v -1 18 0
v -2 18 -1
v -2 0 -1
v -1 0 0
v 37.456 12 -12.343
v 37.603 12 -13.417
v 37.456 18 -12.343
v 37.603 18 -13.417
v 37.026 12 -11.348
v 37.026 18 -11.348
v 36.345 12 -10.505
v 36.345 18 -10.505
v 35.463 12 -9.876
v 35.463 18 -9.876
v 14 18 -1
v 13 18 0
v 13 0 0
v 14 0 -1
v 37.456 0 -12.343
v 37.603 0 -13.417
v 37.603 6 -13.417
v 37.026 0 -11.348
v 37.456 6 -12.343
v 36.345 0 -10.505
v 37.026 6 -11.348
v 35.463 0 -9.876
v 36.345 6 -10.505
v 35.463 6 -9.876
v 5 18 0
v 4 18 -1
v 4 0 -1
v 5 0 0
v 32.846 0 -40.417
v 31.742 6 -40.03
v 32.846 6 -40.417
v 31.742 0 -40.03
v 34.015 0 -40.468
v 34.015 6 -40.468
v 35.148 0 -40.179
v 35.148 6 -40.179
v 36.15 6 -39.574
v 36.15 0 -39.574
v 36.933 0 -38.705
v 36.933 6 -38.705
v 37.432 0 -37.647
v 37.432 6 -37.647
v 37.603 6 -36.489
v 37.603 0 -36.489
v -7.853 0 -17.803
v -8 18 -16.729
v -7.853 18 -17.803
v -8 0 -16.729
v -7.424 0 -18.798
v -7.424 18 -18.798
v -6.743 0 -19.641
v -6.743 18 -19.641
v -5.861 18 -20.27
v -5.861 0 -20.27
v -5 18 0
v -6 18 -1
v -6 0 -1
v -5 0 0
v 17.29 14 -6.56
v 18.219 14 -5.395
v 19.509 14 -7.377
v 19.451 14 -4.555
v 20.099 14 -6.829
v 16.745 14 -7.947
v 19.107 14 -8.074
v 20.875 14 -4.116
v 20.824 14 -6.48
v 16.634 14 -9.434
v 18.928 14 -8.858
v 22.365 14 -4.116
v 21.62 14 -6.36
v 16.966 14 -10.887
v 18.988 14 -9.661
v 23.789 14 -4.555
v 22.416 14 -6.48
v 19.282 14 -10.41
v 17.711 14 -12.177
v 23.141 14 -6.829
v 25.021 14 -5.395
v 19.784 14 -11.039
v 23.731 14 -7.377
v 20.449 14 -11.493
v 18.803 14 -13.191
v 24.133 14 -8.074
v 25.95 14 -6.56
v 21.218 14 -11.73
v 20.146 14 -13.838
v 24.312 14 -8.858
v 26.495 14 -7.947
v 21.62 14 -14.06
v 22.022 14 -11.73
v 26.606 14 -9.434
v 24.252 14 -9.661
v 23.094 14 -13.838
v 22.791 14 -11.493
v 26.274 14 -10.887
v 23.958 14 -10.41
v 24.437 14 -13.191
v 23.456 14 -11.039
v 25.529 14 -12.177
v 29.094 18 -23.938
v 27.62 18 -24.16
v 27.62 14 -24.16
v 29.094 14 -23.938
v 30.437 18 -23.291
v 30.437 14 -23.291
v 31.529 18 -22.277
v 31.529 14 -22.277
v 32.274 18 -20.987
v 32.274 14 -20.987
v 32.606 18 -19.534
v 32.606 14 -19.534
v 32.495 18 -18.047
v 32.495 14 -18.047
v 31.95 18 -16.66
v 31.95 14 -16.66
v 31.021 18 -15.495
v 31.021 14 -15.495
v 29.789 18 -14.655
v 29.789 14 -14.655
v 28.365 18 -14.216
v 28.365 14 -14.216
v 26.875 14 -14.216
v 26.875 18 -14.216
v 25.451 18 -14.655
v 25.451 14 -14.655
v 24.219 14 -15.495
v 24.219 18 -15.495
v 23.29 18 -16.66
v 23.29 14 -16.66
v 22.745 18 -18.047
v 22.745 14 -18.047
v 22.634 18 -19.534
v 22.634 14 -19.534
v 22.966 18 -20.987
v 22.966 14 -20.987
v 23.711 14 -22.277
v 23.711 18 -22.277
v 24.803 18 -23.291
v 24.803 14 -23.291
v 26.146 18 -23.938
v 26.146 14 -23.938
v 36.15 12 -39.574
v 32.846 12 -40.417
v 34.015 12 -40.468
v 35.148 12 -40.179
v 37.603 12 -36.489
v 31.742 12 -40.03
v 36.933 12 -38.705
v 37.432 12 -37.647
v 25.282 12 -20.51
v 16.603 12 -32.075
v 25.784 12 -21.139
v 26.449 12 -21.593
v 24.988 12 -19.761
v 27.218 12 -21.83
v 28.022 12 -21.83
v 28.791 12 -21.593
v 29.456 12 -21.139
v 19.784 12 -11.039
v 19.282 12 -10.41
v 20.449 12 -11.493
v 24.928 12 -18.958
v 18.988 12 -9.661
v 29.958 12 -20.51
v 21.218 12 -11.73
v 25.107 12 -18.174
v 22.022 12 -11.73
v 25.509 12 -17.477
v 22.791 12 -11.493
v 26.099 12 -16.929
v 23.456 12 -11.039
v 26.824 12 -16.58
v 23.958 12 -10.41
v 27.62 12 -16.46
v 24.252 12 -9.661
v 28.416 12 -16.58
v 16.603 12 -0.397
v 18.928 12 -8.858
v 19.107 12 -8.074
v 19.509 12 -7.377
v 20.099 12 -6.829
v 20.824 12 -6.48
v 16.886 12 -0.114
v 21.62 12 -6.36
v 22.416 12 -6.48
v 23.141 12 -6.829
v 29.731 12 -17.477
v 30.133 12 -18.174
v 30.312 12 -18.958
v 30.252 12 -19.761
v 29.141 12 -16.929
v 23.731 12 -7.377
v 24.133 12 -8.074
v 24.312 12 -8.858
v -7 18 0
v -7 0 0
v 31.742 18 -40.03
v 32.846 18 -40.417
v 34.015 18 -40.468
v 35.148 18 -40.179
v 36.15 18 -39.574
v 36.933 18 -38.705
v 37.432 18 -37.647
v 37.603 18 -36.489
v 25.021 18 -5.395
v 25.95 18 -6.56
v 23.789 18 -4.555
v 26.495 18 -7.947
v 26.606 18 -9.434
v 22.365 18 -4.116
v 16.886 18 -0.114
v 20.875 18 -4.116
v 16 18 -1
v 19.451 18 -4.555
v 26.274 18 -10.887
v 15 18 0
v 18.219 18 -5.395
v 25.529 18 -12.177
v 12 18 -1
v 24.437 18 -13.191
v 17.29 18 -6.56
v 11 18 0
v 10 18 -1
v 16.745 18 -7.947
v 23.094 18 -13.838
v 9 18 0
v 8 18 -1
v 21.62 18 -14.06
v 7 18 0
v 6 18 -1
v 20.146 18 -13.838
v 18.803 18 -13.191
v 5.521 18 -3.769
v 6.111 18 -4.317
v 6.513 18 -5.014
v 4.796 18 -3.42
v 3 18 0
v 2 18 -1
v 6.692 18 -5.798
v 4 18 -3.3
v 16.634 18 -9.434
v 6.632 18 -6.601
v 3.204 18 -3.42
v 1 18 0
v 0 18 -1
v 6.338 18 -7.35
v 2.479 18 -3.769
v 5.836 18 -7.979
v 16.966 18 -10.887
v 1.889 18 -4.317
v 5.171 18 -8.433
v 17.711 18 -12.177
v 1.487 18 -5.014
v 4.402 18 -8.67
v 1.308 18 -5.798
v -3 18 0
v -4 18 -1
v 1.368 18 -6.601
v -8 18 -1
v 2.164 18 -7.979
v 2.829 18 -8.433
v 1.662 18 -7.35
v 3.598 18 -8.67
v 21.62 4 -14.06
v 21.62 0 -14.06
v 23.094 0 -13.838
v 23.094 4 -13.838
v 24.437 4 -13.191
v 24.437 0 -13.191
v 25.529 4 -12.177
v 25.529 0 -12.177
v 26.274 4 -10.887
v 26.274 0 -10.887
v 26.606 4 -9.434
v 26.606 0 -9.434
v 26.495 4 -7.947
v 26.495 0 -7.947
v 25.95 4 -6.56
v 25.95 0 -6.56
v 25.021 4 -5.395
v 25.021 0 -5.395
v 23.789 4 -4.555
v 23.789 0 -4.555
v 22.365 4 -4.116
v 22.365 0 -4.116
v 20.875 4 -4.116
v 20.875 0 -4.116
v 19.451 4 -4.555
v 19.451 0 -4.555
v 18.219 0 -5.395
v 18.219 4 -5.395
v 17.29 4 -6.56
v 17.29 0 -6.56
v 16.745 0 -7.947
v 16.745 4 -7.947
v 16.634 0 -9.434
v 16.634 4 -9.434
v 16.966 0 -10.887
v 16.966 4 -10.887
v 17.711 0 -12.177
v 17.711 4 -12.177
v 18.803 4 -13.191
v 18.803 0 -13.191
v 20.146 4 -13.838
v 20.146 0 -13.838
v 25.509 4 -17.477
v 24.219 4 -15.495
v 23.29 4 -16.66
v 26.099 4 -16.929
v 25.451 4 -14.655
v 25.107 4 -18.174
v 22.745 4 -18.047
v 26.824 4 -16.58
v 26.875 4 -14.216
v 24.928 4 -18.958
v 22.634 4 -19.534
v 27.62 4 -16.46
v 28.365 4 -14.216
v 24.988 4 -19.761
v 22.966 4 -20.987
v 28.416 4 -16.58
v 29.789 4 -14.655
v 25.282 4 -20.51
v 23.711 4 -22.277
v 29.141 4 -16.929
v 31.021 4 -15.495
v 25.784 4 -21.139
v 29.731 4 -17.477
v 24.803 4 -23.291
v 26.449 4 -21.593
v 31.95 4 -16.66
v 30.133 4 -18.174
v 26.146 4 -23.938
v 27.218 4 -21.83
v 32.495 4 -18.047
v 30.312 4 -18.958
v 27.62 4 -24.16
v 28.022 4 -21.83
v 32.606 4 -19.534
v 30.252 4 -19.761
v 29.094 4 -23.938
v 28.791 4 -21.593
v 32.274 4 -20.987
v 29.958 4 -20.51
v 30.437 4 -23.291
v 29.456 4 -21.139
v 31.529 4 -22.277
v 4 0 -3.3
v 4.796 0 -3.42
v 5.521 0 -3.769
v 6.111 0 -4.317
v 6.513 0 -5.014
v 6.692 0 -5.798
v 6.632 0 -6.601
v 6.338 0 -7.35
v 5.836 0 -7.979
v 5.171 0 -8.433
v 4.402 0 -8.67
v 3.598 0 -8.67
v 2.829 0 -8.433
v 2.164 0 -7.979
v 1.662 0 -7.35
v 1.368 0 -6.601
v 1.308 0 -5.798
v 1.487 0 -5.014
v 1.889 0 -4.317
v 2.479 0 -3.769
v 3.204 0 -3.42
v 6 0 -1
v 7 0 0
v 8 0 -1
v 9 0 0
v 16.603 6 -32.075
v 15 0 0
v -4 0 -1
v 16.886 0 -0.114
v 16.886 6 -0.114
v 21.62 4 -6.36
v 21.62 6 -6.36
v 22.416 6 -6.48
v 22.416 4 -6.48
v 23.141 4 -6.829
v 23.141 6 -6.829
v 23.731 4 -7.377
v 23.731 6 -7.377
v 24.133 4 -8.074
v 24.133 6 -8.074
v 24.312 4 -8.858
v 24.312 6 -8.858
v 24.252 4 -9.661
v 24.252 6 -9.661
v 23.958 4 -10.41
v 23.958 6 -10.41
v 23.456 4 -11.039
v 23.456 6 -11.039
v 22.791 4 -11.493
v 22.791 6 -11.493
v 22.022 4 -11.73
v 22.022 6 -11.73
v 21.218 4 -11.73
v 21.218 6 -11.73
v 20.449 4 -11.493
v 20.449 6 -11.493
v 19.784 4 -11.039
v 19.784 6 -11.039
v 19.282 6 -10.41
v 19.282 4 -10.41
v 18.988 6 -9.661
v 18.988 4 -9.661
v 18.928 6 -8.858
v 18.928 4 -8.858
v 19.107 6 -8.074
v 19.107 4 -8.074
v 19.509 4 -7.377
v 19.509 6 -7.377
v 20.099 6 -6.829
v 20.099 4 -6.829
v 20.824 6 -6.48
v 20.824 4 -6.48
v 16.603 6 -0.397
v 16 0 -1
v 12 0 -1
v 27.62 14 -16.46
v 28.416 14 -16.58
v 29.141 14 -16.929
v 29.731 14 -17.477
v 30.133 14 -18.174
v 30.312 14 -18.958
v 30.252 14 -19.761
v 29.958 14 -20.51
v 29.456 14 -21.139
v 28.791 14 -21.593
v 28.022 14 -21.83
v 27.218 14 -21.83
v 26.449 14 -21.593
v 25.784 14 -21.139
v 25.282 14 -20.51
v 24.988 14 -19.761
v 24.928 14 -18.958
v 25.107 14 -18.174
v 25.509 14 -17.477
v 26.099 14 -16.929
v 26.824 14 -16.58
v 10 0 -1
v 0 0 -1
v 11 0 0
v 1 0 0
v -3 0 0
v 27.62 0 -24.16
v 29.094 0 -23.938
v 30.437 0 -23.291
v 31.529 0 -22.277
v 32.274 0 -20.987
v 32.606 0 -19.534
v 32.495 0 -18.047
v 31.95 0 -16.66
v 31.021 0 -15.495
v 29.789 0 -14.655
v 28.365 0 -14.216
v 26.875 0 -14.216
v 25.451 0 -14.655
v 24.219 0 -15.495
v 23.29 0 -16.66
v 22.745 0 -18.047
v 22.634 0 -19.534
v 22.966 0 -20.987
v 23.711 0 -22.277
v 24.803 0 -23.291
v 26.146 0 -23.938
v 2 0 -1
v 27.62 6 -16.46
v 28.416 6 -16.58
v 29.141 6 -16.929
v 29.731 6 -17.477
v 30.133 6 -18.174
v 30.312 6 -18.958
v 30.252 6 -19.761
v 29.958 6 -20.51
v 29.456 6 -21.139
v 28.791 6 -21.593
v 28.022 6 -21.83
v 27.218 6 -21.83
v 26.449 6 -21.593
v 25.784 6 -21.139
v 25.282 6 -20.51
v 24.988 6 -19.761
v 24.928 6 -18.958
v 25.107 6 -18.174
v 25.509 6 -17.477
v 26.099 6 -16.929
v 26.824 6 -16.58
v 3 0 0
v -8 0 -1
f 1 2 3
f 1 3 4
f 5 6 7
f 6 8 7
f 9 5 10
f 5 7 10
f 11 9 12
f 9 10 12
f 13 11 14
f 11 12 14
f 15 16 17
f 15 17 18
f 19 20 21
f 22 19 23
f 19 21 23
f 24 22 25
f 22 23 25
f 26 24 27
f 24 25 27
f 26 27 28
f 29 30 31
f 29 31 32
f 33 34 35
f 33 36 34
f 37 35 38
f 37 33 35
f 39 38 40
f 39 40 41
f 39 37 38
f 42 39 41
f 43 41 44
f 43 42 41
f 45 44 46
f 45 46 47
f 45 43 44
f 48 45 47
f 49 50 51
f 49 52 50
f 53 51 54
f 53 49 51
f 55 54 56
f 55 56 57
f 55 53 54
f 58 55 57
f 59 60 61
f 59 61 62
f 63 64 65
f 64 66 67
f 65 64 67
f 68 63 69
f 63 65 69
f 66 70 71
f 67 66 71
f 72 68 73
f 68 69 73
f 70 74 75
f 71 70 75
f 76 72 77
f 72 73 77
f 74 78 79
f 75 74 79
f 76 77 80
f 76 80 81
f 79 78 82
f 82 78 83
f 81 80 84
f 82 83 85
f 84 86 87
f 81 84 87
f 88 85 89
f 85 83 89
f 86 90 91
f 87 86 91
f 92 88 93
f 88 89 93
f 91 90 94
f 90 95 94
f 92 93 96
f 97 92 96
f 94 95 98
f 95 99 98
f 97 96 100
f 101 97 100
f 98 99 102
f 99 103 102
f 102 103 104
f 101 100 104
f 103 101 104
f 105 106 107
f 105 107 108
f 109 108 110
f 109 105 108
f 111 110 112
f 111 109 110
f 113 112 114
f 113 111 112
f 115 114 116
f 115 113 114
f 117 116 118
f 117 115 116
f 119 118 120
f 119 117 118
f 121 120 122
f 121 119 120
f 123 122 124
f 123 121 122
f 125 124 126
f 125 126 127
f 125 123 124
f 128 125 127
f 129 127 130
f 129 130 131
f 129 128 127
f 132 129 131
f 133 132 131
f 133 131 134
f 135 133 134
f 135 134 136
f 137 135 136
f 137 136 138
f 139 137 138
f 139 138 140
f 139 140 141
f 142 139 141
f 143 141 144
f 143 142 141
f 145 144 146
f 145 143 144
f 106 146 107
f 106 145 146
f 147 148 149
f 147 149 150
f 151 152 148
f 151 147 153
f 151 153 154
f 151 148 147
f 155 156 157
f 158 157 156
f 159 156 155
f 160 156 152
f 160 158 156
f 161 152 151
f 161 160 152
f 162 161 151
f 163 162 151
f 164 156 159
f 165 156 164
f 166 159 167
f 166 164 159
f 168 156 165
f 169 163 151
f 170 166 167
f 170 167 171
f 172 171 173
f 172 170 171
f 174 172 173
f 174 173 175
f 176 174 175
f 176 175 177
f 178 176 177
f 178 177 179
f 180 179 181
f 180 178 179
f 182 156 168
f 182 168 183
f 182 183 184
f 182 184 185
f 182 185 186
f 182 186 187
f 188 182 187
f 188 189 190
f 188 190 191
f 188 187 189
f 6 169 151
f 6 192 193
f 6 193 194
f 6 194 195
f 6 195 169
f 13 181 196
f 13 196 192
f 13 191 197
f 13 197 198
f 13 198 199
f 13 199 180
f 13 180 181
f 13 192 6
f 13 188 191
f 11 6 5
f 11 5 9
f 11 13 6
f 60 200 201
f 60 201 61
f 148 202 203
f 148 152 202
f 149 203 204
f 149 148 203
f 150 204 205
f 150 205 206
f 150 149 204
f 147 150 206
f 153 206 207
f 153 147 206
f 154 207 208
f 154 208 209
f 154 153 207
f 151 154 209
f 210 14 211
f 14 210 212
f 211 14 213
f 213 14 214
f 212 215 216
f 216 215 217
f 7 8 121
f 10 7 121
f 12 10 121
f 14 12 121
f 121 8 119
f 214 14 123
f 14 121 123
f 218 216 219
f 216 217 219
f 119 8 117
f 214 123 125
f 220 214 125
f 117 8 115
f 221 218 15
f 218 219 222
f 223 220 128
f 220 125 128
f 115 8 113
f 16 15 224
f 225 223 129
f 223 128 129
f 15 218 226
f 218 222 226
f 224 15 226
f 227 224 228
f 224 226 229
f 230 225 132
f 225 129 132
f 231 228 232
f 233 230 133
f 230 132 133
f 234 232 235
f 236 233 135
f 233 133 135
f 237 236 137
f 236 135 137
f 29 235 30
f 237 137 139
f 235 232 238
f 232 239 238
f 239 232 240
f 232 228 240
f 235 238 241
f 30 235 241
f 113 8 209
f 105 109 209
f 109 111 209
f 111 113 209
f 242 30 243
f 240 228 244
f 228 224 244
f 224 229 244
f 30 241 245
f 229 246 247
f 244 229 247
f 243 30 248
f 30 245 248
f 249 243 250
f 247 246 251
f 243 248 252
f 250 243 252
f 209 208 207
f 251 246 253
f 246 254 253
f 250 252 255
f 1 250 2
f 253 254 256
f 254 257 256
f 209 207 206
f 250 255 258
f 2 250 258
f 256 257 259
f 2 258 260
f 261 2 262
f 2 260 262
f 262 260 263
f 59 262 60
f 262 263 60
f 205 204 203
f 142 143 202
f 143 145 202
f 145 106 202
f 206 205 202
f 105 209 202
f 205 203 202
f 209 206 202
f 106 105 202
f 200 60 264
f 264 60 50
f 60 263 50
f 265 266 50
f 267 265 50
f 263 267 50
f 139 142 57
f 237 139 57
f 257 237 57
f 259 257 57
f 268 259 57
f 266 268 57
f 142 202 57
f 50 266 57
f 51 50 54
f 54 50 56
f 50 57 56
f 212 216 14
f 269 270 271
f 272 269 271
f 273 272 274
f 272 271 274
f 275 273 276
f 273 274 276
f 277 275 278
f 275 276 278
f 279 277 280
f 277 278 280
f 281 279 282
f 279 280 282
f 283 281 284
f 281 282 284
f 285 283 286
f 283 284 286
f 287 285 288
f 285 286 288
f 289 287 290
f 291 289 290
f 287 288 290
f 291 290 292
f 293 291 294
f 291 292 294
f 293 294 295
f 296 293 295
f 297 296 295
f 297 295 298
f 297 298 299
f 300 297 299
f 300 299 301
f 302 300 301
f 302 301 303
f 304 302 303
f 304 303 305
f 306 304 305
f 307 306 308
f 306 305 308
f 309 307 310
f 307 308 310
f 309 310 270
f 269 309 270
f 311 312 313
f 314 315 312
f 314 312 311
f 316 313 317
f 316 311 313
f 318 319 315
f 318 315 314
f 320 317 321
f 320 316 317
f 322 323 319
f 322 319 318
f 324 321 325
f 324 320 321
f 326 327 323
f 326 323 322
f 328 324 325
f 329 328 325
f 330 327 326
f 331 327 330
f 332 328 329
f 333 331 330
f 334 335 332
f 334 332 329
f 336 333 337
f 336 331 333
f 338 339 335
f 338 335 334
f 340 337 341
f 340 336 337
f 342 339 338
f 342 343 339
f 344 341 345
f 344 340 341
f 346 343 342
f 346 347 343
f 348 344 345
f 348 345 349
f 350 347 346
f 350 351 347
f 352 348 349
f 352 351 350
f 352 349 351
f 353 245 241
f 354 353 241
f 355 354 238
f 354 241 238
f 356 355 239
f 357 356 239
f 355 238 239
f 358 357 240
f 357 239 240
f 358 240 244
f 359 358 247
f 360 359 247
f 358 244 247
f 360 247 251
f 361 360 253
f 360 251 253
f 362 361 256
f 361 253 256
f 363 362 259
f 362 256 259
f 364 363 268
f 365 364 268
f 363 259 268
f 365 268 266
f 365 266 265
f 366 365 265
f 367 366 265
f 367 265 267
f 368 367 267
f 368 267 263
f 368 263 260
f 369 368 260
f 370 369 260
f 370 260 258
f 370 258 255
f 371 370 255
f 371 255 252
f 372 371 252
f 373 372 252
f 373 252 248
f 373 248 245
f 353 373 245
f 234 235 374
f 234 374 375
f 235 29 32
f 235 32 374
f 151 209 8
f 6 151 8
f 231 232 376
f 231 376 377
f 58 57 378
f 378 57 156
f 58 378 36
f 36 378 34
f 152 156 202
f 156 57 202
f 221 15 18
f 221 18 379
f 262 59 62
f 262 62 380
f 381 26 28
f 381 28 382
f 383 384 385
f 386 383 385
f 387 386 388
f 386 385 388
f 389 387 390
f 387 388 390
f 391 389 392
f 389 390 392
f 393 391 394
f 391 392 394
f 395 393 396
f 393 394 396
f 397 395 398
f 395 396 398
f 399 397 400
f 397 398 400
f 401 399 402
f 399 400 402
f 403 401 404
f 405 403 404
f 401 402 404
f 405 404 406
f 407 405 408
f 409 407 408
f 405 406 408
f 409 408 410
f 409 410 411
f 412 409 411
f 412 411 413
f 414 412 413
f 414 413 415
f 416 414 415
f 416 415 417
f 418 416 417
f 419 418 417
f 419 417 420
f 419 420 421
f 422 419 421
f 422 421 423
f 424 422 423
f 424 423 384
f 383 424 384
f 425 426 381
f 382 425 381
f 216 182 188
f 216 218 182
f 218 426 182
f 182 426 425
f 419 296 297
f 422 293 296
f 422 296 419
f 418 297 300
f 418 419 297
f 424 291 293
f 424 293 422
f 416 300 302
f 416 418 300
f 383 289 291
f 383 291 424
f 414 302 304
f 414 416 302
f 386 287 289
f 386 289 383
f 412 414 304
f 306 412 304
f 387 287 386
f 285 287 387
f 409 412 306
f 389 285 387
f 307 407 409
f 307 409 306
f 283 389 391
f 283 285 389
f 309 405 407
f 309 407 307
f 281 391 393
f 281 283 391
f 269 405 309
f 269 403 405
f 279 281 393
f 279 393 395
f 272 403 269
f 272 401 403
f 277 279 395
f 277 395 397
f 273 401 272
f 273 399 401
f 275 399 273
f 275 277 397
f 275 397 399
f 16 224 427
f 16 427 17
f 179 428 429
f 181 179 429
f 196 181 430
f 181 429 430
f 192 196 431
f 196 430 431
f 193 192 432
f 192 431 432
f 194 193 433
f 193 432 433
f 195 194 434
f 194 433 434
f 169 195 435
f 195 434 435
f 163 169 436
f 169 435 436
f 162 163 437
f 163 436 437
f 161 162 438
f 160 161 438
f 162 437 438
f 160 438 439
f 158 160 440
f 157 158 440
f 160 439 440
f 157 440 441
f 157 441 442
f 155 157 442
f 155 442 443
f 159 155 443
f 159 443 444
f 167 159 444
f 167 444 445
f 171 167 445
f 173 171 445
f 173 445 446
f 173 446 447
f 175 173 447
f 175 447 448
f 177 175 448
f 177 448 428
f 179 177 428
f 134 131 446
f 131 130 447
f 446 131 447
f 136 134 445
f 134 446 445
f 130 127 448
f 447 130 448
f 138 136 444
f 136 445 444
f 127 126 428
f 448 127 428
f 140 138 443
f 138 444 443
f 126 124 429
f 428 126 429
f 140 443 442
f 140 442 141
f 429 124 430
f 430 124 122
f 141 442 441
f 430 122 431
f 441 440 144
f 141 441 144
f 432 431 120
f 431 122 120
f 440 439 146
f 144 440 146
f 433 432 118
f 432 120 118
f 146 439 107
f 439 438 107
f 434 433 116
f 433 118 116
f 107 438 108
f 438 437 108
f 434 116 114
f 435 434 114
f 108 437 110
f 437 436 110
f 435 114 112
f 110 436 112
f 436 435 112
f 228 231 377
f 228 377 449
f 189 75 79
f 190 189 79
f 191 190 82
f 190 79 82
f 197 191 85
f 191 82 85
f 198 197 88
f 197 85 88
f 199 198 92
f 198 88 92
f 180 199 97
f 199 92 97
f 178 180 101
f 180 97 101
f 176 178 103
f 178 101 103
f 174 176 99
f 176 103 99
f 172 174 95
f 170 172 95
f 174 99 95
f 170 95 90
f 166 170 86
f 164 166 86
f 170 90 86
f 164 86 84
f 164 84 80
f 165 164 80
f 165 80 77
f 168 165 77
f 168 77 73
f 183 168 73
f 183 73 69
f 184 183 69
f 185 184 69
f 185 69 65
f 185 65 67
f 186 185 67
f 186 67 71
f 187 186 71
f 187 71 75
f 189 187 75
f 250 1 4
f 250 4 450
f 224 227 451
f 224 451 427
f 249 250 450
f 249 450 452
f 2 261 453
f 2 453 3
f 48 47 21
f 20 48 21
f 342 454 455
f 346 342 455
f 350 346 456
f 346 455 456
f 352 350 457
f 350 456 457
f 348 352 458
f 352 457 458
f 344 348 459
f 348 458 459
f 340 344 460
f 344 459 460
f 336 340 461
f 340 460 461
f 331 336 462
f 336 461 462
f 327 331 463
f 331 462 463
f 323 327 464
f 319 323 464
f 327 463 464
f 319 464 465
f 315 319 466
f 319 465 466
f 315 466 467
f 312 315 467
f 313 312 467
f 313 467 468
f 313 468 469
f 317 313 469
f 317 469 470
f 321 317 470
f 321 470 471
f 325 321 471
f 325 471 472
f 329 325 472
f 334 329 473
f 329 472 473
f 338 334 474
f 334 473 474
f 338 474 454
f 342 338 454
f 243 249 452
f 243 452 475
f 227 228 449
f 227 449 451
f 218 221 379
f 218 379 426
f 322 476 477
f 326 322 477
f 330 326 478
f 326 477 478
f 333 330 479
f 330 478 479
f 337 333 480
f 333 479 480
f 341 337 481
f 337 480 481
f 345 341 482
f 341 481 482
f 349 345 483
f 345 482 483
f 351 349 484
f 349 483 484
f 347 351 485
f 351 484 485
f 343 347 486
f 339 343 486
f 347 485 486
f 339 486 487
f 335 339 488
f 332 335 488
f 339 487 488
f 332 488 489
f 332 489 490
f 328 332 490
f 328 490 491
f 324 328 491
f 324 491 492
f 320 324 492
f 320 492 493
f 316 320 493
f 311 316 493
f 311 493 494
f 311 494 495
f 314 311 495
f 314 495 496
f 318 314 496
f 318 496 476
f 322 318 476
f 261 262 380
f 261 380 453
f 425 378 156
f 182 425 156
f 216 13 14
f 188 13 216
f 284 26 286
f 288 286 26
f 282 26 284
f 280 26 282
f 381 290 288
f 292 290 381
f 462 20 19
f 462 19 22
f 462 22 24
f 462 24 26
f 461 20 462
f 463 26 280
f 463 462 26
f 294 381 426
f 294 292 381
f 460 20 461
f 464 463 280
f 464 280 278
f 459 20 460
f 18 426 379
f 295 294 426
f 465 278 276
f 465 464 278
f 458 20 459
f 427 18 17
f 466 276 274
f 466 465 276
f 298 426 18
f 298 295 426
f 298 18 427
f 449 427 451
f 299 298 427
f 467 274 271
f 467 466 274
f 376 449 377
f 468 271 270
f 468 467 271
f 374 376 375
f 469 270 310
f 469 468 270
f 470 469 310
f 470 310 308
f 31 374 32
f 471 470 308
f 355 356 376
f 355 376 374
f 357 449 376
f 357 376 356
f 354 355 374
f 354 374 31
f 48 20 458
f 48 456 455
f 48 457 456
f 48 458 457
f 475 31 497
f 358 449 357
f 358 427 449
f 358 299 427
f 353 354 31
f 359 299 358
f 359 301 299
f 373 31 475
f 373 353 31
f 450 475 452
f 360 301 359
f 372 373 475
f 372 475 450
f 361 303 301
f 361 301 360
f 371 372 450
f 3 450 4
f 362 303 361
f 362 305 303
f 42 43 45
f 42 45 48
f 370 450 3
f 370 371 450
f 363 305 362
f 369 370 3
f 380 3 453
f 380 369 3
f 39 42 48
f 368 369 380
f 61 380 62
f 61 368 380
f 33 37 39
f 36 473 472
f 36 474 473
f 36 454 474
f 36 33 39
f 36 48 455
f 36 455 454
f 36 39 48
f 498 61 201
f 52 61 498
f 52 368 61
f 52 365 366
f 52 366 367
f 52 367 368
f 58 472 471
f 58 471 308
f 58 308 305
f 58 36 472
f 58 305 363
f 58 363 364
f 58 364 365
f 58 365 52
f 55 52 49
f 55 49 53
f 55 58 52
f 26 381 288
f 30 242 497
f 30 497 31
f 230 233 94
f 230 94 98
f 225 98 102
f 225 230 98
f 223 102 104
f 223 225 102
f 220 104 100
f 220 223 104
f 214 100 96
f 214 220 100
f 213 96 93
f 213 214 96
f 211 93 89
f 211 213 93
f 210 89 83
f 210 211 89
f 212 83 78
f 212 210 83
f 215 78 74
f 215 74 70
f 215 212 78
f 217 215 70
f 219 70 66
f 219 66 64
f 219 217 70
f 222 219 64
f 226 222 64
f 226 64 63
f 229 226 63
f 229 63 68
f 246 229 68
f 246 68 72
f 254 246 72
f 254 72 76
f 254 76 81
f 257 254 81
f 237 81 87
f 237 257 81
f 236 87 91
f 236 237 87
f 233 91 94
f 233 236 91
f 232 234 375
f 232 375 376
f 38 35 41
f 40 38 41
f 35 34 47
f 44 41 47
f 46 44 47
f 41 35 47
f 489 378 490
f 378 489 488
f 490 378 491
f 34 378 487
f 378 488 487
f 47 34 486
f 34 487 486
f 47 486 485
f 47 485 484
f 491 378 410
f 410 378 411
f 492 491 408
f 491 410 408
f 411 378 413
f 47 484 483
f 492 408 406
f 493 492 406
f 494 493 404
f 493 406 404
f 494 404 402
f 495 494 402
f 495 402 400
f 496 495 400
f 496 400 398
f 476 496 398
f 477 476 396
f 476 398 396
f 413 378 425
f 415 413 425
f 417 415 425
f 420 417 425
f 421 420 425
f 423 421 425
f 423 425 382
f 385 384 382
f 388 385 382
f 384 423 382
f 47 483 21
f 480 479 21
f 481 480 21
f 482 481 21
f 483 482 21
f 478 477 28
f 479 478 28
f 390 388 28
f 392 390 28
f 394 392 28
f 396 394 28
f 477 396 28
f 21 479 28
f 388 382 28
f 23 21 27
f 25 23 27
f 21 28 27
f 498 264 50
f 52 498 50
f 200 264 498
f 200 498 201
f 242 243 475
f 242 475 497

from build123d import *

# Parameters (mm, degrees)
BOSS_EXTRUDE1_DEPTH = 18
BOSS_EXTRUDE2_DEPTH = 18
SKETCH2_R           = 2.7
CUT_EXTRUDE1_DEPTH  = 60.970253183
SKETCH3_W           = 21
SKETCH3_H           = 6
CUT_EXTRUDE2_DEPTH  = 60.970253183
CUT_EXTRUDE5_DEPTH  = 60.970253183
SKETCH5_R           = 5
CUT_EXTRUDE4_DEPTH  = 4
FILLET1_R           = 4


with BuildPart() as part:
    # Sketch1 → Boss-Extrude1 (new body)
    with BuildSketch(Plane(origin=(0, 0, 0), x_dir=(1, 0, 0), z_dir=(0, 1, 0))):
        Polygon((37.602648402, 29.11), (37.602648402, 11), (16.67, 0), (0, 0), (0, 9.35), (0, 15.35), (37.602648402, 35.11), align=None)
    extrude(amount=BOSS_EXTRUDE1_DEPTH)

    # Sketch6 → Boss-Extrude2 (add, through all)
    with BuildSketch(Plane(origin=(0, 18, 0), x_dir=(1, 0, 0), z_dir=(0, 1, 0))):
        Polygon((0, 0), (-8, 0), (-8, 19.146040792), (37.602648402, 43.11), (37.602648402, 35.11), (0, 15.35), align=None)
    extrude(amount=-BOSS_EXTRUDE2_DEPTH)

    # Sketch2 → Cut-Extrude1 (cut, through all)
    with BuildSketch(Plane(origin=(0, 18, 0), x_dir=(1, 0, 0), z_dir=(0, 1, 0))):
        with Locations(Location((4, 6, 0), (0, 0, 270))):
            Circle(SKETCH2_R)
        with Locations(Location((21.62, 9.06, 0), (0, 0, 270))):
            Circle(SKETCH2_R)
        with Locations(Location((27.62, 19.16, 0), (0, 0, 270))):
            Circle(SKETCH2_R)
    extrude(amount=-CUT_EXTRUDE1_DEPTH, mode=Mode.SUBTRACT)

    # Sketch3 → Cut-Extrude2 (cut, through all)
    with BuildSketch(Plane.XY):
        with Locations((27.102648402, 9)):
            Rectangle(SKETCH3_W, SKETCH3_H)
    extrude(amount=-CUT_EXTRUDE2_DEPTH, mode=Mode.SUBTRACT)

    # Sketch4 → Cut-Extrude5 (cut, through all)
    with BuildSketch(Plane(origin=(0, 18, 0), x_dir=(1, 0, 0), z_dir=(0, 1, 0))):
        Polygon((-8, 0), (-8, 1), (-7, 0), (-6, 1), (-5, 0), (-4, 1), (-3, 0), (-2, 1), (-1, 0), (0, 1), (1, 0), (2, 1), (3, 0), (4, 1), (5, 0), (6, 1), (7, 0), (8, 1), (9, 0), (10, 1), (11, 0), (12, 1), (13, 0), (14, 1), (15, 0), (16, 1), (16.88632324, 0.11367676), (16.67, 0), (16.67, -0.2), (-8, -0.2), align=None)
    extrude(amount=-CUT_EXTRUDE5_DEPTH, mode=Mode.SUBTRACT)

    # Sketch5 → Cut-Extrude4 (cut)
    with BuildSketch(Plane.XZ):
        with Locations(Location((21.62, -9.06, 0), (0, 0, 270))):
            Circle(SKETCH5_R)
        with Locations(Location((27.62, -19.16, 0), (0, 0, 270))):
            Circle(SKETCH5_R)
    cut_extrude4 = extrude(amount=-CUT_EXTRUDE4_DEPTH, mode=Mode.SUBTRACT)

    # Mirror1: Cut-Extrude4 across plane
    add(cut_extrude4.mirror(Plane(origin=(0, 9, 0), x_dir=(0, 0, 1), z_dir=(0, -1, 0))), mode=Mode.SUBTRACT)

    # Fillet1
    fillet1_edges = [part.edges().sort_by_distance(p)[0] for p in [
        (37.602648402, 15, -11),
        (-8, 9, -19.146040792),
        (37.602648402, 3, -43.11),
        (37.602648402, 15, -43.11),
        (37.602648402, 3, -11),
    ]]
    fillet(fillet1_edges, radius=FILLET1_R)


solid = part.part
